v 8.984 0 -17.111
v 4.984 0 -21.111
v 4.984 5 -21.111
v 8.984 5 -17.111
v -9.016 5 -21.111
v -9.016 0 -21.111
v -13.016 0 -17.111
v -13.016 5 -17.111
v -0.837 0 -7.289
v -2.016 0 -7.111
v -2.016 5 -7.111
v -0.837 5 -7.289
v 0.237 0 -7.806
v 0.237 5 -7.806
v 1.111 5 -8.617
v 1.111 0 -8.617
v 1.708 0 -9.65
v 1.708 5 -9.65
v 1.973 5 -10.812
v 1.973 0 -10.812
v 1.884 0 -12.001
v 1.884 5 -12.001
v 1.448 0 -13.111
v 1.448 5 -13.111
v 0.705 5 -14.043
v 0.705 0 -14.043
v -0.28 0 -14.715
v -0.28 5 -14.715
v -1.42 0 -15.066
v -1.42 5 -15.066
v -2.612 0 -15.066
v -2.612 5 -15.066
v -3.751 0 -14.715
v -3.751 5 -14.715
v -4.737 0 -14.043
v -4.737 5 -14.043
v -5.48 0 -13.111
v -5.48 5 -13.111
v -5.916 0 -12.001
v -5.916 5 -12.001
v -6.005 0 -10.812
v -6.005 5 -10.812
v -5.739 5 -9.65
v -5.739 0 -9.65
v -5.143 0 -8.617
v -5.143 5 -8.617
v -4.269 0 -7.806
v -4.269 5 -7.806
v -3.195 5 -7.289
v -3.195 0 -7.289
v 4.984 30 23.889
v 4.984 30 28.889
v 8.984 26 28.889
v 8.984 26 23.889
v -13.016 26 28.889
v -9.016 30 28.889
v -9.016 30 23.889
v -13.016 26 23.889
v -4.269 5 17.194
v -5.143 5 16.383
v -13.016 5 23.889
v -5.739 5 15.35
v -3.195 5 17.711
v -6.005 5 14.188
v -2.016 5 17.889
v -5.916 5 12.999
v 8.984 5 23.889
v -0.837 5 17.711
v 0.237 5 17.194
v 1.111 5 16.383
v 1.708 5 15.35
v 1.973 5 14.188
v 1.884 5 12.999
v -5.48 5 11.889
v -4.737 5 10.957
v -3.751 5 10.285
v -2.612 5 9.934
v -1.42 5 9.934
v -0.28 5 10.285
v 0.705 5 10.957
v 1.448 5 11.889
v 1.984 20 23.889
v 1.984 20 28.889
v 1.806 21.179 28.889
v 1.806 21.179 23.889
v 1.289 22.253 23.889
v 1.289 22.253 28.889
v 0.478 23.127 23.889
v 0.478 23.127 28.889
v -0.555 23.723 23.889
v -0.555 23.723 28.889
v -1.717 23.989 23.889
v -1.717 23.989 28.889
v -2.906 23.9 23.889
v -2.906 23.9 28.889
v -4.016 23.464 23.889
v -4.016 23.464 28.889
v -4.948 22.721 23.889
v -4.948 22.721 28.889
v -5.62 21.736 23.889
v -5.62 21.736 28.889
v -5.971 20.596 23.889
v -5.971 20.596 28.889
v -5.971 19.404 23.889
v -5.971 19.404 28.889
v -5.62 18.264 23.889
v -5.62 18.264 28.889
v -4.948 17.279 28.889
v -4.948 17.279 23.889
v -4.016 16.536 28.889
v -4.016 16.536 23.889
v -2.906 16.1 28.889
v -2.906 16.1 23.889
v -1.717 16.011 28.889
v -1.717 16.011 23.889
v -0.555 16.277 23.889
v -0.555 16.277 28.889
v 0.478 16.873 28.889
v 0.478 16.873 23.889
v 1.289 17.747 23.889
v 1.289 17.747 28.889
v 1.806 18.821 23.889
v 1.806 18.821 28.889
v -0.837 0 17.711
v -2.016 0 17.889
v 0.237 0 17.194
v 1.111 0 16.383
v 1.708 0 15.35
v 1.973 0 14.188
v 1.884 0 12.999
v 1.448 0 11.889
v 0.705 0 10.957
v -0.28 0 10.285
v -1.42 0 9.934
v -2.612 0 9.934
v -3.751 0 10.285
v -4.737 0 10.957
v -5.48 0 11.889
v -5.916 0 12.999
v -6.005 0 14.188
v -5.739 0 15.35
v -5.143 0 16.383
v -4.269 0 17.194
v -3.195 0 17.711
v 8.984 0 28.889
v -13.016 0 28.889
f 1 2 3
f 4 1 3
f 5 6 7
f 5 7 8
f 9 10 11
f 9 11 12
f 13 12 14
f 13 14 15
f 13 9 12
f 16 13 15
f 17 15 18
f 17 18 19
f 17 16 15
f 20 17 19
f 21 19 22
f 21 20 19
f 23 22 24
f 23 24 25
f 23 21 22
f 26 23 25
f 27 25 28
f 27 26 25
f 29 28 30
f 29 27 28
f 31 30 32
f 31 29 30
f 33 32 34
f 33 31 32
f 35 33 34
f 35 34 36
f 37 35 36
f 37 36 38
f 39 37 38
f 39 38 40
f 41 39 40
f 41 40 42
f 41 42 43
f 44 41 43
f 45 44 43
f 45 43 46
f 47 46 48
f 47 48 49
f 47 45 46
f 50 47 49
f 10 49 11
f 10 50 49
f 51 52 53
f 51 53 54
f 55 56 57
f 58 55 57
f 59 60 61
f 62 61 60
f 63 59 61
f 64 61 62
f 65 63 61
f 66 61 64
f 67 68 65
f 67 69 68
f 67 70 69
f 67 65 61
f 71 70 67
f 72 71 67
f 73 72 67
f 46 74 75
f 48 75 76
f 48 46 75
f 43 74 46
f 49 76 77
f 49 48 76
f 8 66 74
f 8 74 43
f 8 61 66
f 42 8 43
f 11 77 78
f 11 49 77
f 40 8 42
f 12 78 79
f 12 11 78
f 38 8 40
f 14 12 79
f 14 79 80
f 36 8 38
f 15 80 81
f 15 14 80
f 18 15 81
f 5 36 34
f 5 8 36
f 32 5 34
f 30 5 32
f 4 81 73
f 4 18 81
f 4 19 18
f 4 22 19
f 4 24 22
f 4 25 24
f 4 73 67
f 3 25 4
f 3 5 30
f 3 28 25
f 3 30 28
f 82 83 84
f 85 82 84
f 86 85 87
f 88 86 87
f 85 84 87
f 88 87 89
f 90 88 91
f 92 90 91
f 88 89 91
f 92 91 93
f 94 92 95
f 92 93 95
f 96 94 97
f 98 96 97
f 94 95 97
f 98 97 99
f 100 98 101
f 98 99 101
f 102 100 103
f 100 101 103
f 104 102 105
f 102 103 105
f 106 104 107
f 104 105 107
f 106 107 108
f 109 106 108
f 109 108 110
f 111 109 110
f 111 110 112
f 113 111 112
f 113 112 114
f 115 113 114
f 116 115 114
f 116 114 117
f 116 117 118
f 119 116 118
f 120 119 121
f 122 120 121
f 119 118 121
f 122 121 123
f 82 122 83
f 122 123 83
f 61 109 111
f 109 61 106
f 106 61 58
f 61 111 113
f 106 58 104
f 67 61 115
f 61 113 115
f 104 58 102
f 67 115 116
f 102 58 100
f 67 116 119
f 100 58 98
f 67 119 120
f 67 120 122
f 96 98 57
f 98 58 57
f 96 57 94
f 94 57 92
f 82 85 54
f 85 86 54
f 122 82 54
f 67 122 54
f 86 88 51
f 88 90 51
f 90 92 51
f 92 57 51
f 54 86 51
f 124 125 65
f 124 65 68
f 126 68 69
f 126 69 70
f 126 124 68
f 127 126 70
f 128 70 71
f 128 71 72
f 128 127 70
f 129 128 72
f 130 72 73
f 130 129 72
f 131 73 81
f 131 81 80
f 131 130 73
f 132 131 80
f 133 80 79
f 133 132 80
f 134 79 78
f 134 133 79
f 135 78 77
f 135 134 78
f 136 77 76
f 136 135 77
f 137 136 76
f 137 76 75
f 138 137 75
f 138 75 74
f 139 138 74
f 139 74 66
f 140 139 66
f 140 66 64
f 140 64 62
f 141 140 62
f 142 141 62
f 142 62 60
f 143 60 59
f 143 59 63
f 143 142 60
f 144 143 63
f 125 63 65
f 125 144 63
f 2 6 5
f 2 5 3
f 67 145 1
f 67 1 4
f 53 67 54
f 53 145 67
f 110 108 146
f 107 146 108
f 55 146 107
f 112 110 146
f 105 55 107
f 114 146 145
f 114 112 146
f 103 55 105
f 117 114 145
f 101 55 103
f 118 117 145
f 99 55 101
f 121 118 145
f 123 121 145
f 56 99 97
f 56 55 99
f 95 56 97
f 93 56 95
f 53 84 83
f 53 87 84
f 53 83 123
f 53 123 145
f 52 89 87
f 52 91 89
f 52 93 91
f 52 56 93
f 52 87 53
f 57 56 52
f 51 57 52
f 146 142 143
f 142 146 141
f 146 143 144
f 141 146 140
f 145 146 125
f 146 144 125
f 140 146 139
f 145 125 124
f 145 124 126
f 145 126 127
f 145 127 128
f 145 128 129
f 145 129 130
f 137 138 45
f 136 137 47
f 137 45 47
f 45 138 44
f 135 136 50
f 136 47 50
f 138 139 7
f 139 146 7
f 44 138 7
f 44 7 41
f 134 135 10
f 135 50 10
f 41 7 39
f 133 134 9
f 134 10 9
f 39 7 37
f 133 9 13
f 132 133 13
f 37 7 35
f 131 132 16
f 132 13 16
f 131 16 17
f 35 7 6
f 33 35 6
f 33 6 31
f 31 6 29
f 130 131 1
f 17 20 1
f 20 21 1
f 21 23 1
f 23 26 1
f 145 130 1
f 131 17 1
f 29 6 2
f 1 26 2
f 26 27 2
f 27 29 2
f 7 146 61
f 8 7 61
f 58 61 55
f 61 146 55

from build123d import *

# Parameters (mm, degrees)
SKETCH_1_W      = 22
SKETCH_1_H      = 50
SKETCH_1_R      = 4
EXTRUDE_1_DEPTH = 5
SKETCH_2_W      = 22
SKETCH_2_H      = 25
SKETCH_2_R      = 4
EXTRUDE_2_DEPTH = 5
CHAMFER_1_SIZE  = 4


with BuildPart() as part:
    # 草图1 → 凸台-拉伸1 (new body)
    with BuildSketch(Plane(origin=(0, 0, 0), x_dir=(1, 0, 0), z_dir=(0, 1, 0))):
        with Locations((-2.015873016, -3.888888889)):
            Rectangle(SKETCH_1_W, SKETCH_1_H)
        with Locations(Location((-2.015873016, 11.111111111, 0), (0, 0, 270))):
            Circle(SKETCH_1_R, mode=Mode.SUBTRACT)
        with Locations(Location((-2.015873016, -13.888888889, 0), (0, 0, 270))):
            Circle(SKETCH_1_R, mode=Mode.SUBTRACT)
    extrude(amount=EXTRUDE_1_DEPTH)

    # 草图2 → 凸台-拉伸2 (add)
    with BuildSketch(Plane.XY.offset(28.888888889)):
        with Locations((-2.015873016, 17.5)):
            Rectangle(SKETCH_2_W, SKETCH_2_H)
        with Locations((-2.015873016, 20)):
            Circle(SKETCH_2_R, mode=Mode.SUBTRACT)
    extrude(amount=-EXTRUDE_2_DEPTH)

    # 倒角1
    chamfer_1_edges = [part.edges().sort_by_distance(p)[0] for p in [
        (-13.015873016, 30, 26.388888889),
        (8.984126984, 30, 26.388888889),
        (-13.015873016, 2.5, -21.111111111),
        (8.984126984, 2.5, -21.111111111),
    ]]
    chamfer(chamfer_1_edges, length=CHAMFER_1_SIZE)


solid = part.part
